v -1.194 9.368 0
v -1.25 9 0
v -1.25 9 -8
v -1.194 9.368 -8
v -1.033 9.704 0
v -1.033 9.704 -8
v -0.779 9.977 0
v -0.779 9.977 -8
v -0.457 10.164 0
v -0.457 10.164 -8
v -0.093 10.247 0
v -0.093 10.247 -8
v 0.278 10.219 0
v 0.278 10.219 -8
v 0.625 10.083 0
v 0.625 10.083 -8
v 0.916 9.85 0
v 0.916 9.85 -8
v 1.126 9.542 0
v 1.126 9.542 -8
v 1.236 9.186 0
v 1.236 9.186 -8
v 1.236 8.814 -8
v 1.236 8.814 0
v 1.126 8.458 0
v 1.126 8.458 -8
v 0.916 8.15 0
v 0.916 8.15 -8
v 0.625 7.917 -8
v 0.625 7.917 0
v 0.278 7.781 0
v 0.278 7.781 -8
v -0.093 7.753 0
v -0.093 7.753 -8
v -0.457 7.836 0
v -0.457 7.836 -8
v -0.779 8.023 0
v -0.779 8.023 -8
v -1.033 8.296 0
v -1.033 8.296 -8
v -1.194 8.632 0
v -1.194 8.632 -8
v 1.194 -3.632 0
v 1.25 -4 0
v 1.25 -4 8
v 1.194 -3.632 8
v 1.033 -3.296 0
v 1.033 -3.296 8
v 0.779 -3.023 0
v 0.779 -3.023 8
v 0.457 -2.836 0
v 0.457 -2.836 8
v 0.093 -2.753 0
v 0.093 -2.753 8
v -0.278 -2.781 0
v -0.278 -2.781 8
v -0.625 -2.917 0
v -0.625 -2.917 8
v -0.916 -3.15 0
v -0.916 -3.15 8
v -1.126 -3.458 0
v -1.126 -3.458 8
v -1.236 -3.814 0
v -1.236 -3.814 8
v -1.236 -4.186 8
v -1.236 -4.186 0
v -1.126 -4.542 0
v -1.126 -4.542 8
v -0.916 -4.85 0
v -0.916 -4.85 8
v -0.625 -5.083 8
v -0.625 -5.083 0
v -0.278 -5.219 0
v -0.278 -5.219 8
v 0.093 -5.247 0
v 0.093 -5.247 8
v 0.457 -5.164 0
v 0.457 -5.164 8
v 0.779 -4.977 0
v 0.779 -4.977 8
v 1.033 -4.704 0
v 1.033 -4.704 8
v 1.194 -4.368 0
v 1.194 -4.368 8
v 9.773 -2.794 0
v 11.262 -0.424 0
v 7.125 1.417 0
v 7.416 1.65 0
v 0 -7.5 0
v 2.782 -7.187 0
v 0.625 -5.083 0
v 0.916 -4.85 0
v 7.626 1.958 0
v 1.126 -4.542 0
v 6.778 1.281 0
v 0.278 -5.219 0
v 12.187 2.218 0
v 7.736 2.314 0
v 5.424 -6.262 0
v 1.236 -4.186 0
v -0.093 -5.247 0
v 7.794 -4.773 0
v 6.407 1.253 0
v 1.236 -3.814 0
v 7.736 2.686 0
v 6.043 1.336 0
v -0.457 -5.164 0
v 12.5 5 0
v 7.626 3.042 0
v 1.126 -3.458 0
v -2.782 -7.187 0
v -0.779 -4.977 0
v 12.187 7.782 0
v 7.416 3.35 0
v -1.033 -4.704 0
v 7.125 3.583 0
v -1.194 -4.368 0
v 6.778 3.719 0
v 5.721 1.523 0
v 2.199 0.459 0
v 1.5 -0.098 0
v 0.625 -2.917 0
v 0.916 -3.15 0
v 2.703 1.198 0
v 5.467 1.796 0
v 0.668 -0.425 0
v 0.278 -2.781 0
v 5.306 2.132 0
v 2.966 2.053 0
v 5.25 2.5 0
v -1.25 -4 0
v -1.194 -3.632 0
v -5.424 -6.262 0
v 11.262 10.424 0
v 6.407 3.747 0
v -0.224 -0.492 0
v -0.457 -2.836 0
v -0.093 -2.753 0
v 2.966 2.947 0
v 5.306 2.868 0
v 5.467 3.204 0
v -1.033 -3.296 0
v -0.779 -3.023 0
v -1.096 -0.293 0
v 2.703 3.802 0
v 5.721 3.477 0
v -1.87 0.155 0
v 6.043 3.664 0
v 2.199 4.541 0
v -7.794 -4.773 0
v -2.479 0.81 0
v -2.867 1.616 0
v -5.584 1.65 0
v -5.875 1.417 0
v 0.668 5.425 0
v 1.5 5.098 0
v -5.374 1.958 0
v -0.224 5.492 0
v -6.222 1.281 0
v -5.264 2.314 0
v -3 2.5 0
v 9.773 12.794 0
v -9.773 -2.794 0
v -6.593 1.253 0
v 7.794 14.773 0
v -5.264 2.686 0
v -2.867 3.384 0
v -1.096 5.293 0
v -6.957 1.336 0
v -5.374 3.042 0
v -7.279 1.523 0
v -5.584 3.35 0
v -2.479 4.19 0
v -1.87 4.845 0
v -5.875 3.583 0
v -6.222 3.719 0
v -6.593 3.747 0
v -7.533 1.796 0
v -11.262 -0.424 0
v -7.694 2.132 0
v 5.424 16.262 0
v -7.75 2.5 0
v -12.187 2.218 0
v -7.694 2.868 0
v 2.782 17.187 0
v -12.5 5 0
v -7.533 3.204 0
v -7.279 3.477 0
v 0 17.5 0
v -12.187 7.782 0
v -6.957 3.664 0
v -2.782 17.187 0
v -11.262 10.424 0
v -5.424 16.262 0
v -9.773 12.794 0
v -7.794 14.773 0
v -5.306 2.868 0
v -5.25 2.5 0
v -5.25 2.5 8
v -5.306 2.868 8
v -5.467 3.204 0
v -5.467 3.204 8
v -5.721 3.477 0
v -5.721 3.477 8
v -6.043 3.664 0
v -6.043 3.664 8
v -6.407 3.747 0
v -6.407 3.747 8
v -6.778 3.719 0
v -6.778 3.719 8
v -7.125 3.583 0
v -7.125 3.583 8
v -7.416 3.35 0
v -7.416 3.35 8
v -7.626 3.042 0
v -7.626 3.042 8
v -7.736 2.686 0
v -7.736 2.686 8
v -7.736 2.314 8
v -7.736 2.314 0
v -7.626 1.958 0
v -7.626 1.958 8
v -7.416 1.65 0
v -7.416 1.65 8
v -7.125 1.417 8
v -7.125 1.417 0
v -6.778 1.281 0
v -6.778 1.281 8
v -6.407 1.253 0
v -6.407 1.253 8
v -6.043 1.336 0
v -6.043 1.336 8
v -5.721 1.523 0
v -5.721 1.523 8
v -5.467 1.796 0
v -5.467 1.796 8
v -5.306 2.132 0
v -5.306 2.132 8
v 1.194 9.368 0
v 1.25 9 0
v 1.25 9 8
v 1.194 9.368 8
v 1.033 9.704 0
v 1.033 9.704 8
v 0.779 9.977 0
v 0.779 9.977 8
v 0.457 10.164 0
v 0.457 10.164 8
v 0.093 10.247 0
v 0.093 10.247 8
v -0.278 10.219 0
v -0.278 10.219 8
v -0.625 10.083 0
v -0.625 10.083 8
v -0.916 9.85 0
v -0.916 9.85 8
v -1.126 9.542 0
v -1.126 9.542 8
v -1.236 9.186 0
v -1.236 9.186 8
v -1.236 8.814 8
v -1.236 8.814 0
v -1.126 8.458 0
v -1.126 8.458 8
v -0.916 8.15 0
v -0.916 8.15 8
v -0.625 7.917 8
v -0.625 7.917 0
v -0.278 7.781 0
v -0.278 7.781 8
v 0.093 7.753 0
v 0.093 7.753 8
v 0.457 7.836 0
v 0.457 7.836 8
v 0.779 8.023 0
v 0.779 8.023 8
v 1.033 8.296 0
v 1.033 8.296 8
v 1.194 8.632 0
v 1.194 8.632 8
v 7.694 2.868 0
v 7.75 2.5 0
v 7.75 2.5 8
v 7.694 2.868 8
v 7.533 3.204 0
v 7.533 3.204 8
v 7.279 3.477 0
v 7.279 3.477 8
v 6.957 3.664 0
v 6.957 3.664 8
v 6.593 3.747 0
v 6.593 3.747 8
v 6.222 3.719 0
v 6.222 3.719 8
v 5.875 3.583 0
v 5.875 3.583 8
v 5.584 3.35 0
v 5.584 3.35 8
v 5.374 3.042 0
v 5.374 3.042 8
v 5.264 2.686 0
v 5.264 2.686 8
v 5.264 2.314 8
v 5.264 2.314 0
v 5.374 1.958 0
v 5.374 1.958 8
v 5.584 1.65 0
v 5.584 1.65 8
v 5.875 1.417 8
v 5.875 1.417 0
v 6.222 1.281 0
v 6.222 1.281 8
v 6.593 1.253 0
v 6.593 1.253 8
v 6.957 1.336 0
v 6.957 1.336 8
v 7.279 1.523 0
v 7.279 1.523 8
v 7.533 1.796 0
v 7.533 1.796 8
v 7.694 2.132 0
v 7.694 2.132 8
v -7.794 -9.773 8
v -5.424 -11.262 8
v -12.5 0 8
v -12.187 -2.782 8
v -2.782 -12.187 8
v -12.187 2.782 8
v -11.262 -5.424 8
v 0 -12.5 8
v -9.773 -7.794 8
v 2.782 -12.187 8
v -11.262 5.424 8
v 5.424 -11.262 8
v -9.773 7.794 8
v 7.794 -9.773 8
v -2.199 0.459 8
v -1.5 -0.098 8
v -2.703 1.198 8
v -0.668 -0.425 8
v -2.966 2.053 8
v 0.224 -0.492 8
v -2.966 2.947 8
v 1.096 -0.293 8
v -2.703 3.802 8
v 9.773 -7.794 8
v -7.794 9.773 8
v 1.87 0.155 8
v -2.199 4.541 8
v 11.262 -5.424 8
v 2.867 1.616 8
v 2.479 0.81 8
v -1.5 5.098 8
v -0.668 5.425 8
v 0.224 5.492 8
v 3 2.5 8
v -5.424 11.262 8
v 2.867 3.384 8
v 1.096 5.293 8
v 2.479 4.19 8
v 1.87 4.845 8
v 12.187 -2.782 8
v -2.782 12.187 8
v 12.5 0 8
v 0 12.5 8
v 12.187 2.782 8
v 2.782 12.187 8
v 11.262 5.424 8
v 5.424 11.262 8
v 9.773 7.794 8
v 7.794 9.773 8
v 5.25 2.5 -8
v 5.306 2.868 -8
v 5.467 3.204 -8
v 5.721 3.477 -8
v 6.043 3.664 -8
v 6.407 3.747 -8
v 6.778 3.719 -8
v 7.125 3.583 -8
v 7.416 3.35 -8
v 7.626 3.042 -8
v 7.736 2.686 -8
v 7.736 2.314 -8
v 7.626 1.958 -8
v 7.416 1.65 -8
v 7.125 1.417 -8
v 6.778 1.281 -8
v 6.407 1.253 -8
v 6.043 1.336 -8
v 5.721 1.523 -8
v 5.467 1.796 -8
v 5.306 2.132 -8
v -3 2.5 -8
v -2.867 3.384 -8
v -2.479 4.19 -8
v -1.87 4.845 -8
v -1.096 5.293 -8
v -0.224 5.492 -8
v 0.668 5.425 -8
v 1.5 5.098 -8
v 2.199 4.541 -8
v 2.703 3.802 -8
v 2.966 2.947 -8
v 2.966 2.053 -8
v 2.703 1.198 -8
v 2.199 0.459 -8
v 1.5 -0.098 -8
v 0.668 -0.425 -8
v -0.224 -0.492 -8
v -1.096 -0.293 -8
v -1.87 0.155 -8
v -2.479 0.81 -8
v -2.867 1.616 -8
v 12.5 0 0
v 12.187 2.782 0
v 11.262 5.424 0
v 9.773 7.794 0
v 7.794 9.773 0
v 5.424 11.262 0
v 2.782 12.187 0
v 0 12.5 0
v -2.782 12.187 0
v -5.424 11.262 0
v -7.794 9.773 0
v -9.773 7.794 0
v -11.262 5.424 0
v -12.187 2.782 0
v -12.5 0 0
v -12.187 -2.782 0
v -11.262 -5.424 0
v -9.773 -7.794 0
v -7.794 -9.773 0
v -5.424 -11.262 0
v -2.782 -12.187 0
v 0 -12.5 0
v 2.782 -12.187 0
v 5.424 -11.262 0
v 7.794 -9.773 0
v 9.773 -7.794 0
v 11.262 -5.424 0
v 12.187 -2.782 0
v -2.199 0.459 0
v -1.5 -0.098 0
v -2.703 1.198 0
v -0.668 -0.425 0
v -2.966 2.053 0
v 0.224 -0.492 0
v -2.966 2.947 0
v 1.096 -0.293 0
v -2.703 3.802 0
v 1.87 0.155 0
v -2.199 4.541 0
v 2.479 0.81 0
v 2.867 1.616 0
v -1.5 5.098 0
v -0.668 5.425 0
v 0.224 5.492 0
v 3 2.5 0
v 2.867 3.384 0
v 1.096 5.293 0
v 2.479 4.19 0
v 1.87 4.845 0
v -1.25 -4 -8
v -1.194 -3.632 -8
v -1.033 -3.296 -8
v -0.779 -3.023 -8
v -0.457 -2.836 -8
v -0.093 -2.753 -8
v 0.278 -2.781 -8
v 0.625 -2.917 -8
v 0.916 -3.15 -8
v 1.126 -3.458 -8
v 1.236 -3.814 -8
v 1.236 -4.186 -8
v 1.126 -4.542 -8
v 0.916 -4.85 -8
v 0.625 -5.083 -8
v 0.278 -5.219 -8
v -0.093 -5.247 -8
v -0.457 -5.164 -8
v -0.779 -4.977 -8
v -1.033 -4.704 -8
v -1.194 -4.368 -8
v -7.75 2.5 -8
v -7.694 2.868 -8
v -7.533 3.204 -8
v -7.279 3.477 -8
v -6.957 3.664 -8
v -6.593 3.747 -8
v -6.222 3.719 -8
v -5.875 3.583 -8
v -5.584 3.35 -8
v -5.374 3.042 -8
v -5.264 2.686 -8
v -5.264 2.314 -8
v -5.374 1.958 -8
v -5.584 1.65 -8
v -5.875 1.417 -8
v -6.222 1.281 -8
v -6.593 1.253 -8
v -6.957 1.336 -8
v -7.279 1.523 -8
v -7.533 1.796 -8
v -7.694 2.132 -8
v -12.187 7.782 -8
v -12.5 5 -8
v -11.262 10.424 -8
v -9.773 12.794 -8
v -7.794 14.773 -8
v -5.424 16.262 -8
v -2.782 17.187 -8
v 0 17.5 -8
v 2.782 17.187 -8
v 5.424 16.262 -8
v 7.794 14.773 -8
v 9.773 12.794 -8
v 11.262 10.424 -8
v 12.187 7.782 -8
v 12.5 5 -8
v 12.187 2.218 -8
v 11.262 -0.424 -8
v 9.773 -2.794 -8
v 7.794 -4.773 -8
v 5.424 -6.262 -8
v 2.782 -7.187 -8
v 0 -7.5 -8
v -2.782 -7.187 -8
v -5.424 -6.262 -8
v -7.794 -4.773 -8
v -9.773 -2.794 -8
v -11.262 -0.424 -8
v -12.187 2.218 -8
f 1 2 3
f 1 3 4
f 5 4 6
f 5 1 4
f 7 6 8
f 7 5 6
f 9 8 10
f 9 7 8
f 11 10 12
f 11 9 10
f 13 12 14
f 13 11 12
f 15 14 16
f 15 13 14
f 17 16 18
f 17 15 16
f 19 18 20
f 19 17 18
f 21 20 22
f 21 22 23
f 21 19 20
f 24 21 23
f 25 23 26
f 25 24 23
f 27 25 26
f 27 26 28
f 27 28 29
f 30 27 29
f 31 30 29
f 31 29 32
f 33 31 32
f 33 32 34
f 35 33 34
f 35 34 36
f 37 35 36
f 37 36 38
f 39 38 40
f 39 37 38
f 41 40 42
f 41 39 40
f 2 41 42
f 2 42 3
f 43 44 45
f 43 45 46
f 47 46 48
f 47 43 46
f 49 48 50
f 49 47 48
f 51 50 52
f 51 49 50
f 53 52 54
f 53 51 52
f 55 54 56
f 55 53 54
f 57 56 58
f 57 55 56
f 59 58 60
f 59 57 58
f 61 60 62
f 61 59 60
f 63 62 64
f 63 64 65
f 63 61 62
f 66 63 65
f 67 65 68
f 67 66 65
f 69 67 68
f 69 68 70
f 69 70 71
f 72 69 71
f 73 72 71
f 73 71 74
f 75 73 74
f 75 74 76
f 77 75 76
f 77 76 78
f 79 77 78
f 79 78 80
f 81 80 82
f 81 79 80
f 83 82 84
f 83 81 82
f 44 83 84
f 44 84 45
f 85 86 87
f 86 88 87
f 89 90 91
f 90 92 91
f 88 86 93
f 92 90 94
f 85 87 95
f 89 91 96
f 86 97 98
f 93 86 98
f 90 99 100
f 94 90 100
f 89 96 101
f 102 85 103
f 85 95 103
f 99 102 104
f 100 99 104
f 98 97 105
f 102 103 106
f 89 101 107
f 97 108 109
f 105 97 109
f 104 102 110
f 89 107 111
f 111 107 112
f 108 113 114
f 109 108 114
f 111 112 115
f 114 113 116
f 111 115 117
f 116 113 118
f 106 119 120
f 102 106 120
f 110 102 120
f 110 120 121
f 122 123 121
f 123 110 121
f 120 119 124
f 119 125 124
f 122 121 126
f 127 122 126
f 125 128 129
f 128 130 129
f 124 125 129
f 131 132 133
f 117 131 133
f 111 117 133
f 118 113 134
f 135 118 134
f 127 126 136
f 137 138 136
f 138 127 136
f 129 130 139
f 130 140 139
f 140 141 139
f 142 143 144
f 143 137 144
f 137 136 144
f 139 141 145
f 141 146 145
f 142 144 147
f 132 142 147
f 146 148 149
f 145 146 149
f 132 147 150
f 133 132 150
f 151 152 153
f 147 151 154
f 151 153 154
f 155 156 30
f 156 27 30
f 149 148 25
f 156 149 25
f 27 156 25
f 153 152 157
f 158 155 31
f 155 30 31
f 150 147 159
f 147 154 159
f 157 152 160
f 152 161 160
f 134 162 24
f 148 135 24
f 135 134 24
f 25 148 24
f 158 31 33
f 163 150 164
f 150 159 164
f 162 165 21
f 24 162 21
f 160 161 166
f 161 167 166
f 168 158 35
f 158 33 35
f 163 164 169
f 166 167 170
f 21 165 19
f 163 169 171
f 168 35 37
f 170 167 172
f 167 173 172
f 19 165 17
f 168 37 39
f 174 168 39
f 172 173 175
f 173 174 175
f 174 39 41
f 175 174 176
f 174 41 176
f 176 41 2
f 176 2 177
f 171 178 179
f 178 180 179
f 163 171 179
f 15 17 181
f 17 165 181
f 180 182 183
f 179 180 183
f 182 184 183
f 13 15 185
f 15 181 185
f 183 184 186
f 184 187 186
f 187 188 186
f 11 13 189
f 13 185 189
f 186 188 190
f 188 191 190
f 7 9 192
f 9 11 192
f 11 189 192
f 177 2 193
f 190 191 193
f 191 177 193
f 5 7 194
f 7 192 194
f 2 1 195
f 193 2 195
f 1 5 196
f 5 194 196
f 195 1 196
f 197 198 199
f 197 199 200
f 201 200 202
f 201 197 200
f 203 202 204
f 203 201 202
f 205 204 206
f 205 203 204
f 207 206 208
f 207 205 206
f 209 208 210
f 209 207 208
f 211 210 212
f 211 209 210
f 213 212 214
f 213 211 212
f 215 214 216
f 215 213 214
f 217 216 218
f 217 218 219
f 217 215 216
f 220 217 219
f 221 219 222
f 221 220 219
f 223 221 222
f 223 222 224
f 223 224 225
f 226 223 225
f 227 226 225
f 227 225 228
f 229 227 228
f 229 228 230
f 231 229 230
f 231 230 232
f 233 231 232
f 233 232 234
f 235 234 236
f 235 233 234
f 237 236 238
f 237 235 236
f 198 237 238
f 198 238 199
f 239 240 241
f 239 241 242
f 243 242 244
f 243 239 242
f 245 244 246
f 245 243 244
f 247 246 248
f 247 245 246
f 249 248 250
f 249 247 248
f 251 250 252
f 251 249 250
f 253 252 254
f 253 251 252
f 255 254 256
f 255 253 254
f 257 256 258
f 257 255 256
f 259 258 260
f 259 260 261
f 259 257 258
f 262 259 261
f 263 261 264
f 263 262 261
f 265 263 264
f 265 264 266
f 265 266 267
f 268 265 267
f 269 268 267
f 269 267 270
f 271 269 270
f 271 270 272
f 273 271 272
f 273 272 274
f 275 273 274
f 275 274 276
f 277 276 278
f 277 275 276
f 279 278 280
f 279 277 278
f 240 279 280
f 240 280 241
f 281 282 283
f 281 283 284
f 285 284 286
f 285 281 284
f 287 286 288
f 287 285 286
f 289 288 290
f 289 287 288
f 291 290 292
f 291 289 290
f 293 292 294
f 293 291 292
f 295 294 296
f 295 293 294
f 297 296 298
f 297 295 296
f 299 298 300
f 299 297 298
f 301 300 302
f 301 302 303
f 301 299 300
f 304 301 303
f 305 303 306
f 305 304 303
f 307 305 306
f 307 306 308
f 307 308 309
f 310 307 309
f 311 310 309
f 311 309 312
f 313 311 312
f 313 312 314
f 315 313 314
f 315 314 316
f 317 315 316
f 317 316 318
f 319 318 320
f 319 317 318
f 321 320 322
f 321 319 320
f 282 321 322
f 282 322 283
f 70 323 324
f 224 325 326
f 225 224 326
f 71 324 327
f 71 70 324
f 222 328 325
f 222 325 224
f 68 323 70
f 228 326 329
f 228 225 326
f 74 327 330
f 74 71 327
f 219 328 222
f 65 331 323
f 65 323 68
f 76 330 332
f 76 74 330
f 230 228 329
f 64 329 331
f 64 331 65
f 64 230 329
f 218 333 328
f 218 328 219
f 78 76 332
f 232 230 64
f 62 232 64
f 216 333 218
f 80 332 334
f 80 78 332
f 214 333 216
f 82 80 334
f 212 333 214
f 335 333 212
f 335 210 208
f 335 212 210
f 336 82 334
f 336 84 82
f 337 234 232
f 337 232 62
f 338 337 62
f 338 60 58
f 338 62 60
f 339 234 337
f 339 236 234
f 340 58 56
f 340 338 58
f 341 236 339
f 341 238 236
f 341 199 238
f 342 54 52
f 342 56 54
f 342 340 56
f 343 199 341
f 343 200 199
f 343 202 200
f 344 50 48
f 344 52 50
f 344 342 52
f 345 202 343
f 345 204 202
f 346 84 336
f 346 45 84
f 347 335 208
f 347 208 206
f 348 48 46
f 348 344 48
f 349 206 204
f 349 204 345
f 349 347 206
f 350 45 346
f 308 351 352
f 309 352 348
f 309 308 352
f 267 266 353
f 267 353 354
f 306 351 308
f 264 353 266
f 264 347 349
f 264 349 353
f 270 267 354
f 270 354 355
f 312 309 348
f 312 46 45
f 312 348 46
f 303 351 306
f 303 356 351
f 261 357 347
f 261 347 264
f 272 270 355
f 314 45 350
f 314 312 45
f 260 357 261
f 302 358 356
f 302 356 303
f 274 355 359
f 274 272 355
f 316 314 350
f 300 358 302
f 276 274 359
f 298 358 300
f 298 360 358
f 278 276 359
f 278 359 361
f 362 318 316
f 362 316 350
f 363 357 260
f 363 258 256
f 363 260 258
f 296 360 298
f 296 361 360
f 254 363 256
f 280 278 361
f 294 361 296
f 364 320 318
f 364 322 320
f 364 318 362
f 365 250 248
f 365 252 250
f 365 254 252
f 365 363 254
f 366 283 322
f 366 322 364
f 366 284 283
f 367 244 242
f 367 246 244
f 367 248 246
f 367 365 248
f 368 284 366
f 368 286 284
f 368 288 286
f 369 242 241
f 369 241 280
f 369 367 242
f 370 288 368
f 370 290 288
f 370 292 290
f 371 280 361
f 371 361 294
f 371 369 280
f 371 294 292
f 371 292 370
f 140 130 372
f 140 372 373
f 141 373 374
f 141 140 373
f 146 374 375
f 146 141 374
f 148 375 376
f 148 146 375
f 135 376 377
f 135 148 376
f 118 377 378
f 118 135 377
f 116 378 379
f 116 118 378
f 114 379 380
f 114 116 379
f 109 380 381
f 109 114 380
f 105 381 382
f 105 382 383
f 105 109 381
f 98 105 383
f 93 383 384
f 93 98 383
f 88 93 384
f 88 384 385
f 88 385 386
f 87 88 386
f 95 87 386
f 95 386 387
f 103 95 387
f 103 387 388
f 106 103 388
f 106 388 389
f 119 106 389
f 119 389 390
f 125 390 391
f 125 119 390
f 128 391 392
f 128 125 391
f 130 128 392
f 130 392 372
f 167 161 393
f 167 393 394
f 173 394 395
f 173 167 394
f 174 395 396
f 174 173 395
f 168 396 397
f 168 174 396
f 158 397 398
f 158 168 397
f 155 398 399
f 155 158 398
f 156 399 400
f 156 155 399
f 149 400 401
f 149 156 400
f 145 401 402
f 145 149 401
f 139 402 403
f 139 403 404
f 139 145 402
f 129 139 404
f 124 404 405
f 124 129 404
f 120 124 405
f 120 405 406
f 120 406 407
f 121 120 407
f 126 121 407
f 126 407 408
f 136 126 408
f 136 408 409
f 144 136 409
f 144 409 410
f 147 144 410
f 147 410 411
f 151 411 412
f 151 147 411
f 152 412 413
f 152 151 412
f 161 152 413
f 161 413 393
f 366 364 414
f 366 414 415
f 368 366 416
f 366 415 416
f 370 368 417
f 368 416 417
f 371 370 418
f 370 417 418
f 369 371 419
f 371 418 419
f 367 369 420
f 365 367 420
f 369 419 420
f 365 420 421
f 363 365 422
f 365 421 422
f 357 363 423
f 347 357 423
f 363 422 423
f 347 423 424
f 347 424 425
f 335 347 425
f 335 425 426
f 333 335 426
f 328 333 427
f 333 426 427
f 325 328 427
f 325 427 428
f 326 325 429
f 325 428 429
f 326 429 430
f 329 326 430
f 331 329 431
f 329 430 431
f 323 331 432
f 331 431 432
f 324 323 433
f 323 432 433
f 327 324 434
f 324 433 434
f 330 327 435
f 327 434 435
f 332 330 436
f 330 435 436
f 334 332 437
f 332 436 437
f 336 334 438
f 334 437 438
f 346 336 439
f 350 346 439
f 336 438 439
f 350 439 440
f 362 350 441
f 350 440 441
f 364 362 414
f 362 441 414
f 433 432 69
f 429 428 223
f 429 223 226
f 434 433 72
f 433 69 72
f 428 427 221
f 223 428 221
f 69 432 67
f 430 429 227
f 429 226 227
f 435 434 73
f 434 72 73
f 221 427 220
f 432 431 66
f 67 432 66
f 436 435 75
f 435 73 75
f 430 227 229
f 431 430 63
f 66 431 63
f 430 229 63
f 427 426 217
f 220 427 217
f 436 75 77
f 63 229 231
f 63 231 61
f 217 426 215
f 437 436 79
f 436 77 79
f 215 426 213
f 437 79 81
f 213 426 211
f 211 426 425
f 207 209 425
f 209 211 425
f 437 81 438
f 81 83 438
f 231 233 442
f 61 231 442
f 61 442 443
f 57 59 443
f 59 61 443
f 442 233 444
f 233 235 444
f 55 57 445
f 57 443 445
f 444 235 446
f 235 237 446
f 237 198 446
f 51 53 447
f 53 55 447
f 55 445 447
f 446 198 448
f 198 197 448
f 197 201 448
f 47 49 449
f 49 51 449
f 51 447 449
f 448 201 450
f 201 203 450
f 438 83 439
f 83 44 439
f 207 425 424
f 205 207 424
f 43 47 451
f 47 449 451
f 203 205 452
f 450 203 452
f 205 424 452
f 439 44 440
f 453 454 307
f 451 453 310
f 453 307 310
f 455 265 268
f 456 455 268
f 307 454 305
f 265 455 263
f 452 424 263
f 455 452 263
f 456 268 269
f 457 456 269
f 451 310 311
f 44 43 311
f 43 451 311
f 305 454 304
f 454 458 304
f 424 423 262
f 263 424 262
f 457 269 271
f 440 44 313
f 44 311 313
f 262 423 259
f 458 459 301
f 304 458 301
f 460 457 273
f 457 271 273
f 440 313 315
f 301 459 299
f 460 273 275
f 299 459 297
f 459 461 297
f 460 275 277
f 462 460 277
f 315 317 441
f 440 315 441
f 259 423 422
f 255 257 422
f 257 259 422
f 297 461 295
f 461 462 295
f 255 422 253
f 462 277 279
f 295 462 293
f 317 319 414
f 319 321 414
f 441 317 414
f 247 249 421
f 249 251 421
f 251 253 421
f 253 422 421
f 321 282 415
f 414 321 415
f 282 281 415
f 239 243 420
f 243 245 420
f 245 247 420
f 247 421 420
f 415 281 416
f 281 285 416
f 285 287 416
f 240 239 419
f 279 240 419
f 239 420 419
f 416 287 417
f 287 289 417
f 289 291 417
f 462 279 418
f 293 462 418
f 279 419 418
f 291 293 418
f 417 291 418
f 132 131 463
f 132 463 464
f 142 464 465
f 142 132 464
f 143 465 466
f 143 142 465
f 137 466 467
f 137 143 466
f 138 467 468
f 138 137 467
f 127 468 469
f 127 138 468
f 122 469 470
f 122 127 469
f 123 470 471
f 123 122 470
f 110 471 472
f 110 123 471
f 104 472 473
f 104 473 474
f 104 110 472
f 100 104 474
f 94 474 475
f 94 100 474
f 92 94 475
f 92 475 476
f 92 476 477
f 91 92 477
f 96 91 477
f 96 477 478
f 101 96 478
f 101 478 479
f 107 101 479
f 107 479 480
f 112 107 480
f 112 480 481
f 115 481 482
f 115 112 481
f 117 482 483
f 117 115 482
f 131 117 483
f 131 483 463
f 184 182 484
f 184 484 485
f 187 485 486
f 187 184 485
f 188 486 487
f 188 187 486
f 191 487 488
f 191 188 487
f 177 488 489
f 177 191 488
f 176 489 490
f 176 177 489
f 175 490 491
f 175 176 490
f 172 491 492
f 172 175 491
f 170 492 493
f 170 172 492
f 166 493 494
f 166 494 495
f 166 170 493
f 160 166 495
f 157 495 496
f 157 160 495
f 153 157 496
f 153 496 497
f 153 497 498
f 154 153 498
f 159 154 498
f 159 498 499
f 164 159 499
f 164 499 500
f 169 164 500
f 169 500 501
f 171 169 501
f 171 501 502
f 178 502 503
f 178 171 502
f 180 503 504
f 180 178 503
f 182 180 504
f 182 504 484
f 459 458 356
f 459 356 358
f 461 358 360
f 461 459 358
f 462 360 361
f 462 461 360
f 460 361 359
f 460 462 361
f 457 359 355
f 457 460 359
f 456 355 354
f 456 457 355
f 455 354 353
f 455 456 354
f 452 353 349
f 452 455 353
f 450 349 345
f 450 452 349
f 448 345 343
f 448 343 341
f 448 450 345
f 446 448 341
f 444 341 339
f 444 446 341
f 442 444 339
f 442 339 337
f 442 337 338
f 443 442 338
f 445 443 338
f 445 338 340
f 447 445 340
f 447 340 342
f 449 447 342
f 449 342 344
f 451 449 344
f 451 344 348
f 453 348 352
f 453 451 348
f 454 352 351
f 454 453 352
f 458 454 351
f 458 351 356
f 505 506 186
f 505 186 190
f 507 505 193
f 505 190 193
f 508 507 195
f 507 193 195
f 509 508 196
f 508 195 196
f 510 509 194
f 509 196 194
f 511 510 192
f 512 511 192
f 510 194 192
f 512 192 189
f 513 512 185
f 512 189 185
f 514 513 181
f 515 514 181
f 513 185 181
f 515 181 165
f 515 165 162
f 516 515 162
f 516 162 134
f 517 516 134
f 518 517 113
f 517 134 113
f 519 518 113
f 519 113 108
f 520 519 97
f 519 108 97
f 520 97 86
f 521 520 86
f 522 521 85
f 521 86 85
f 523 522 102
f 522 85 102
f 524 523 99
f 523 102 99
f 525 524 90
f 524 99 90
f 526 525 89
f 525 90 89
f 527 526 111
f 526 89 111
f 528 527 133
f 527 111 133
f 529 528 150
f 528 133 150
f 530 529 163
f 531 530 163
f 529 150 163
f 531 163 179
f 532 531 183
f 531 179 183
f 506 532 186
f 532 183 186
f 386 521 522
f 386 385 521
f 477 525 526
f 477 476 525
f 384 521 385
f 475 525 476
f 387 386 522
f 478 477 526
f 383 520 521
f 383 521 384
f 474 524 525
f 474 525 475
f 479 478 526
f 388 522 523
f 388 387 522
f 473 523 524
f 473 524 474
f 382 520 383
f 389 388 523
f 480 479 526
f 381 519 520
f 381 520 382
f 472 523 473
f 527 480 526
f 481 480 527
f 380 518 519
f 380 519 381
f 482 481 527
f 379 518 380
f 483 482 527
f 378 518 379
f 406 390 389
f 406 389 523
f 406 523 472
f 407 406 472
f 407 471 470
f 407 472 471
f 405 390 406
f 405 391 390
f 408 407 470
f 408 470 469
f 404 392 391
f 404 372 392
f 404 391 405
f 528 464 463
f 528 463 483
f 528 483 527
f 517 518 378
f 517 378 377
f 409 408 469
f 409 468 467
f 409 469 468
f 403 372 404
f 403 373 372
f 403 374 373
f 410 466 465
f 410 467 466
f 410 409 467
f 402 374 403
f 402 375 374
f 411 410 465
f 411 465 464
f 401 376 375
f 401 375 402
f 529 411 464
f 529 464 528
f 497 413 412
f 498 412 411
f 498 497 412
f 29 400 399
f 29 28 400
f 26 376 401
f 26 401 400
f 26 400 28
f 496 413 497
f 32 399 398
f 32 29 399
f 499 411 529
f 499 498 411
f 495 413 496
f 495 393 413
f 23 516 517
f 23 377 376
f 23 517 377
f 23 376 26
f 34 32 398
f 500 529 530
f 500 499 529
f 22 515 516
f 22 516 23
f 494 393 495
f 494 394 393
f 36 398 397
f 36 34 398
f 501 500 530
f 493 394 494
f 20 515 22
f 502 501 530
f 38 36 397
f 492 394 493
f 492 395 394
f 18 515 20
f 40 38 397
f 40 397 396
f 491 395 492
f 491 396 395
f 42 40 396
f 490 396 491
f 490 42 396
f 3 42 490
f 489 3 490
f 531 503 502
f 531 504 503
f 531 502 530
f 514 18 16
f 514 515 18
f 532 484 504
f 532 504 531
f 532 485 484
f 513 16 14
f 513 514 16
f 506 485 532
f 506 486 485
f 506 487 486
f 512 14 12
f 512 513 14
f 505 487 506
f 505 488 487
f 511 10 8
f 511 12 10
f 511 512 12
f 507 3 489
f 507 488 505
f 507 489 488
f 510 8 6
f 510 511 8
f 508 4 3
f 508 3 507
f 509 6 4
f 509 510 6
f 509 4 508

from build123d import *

# Parameters (mm, degrees)
SKETCH_1_R      = 12.5
SKETCH_1_R_2    = 1.25
SKETCH_1_R_3    = 3
EXTRUDE_3_DEPTH = 8
SKETCH_4_R      = 12.5
SKETCH_4_R_2    = 1.25
SKETCH_4_R_3    = 3
EXTRUDE_4_DEPTH = 8


with BuildPart() as part:
    # ｽｹｯﾁ1 → ﾎﾞｽ - 押し出し3 (new body)
    with BuildSketch(Plane.XY):
        Circle(SKETCH_1_R)
        with Locations((0, -4)):
            Circle(SKETCH_1_R_2, mode=Mode.SUBTRACT)
        with Locations((-6.5, 2.5)):
            Circle(SKETCH_1_R_2, mode=Mode.SUBTRACT)
        with Locations((0, 9)):
            Circle(SKETCH_1_R_2, mode=Mode.SUBTRACT)
        with Locations((6.5, 2.5)):
            Circle(SKETCH_1_R_2, mode=Mode.SUBTRACT)
        with Locations((0, 2.5)):
            Circle(SKETCH_1_R_3, mode=Mode.SUBTRACT)
    extrude(amount=EXTRUDE_3_DEPTH)


with BuildPart() as body_2:
    # ｽｹｯﾁ4 → ﾎﾞｽ - 押し出し4 (new body)
    with BuildSketch(Plane(origin=(0, 0, 0), x_dir=(-1, 0, 0), z_dir=(0, 0, -1))):
        with Locations((0, 5)):
            Circle(SKETCH_4_R)
        with Locations((0, 9)):
            Circle(SKETCH_4_R_2, mode=Mode.SUBTRACT)
        with Locations((6.5, 2.5)):
            Circle(SKETCH_4_R_2, mode=Mode.SUBTRACT)
        with Locations((0, -4)):
            Circle(SKETCH_4_R_2, mode=Mode.SUBTRACT)
        with Locations((-6.5, 2.5)):
            Circle(SKETCH_4_R_2, mode=Mode.SUBTRACT)
        with Locations((0, 2.5)):
            Circle(SKETCH_4_R_3, mode=Mode.SUBTRACT)
    extrude(amount=EXTRUDE_4_DEPTH)


solid = Compound([part.part, body_2.part])
